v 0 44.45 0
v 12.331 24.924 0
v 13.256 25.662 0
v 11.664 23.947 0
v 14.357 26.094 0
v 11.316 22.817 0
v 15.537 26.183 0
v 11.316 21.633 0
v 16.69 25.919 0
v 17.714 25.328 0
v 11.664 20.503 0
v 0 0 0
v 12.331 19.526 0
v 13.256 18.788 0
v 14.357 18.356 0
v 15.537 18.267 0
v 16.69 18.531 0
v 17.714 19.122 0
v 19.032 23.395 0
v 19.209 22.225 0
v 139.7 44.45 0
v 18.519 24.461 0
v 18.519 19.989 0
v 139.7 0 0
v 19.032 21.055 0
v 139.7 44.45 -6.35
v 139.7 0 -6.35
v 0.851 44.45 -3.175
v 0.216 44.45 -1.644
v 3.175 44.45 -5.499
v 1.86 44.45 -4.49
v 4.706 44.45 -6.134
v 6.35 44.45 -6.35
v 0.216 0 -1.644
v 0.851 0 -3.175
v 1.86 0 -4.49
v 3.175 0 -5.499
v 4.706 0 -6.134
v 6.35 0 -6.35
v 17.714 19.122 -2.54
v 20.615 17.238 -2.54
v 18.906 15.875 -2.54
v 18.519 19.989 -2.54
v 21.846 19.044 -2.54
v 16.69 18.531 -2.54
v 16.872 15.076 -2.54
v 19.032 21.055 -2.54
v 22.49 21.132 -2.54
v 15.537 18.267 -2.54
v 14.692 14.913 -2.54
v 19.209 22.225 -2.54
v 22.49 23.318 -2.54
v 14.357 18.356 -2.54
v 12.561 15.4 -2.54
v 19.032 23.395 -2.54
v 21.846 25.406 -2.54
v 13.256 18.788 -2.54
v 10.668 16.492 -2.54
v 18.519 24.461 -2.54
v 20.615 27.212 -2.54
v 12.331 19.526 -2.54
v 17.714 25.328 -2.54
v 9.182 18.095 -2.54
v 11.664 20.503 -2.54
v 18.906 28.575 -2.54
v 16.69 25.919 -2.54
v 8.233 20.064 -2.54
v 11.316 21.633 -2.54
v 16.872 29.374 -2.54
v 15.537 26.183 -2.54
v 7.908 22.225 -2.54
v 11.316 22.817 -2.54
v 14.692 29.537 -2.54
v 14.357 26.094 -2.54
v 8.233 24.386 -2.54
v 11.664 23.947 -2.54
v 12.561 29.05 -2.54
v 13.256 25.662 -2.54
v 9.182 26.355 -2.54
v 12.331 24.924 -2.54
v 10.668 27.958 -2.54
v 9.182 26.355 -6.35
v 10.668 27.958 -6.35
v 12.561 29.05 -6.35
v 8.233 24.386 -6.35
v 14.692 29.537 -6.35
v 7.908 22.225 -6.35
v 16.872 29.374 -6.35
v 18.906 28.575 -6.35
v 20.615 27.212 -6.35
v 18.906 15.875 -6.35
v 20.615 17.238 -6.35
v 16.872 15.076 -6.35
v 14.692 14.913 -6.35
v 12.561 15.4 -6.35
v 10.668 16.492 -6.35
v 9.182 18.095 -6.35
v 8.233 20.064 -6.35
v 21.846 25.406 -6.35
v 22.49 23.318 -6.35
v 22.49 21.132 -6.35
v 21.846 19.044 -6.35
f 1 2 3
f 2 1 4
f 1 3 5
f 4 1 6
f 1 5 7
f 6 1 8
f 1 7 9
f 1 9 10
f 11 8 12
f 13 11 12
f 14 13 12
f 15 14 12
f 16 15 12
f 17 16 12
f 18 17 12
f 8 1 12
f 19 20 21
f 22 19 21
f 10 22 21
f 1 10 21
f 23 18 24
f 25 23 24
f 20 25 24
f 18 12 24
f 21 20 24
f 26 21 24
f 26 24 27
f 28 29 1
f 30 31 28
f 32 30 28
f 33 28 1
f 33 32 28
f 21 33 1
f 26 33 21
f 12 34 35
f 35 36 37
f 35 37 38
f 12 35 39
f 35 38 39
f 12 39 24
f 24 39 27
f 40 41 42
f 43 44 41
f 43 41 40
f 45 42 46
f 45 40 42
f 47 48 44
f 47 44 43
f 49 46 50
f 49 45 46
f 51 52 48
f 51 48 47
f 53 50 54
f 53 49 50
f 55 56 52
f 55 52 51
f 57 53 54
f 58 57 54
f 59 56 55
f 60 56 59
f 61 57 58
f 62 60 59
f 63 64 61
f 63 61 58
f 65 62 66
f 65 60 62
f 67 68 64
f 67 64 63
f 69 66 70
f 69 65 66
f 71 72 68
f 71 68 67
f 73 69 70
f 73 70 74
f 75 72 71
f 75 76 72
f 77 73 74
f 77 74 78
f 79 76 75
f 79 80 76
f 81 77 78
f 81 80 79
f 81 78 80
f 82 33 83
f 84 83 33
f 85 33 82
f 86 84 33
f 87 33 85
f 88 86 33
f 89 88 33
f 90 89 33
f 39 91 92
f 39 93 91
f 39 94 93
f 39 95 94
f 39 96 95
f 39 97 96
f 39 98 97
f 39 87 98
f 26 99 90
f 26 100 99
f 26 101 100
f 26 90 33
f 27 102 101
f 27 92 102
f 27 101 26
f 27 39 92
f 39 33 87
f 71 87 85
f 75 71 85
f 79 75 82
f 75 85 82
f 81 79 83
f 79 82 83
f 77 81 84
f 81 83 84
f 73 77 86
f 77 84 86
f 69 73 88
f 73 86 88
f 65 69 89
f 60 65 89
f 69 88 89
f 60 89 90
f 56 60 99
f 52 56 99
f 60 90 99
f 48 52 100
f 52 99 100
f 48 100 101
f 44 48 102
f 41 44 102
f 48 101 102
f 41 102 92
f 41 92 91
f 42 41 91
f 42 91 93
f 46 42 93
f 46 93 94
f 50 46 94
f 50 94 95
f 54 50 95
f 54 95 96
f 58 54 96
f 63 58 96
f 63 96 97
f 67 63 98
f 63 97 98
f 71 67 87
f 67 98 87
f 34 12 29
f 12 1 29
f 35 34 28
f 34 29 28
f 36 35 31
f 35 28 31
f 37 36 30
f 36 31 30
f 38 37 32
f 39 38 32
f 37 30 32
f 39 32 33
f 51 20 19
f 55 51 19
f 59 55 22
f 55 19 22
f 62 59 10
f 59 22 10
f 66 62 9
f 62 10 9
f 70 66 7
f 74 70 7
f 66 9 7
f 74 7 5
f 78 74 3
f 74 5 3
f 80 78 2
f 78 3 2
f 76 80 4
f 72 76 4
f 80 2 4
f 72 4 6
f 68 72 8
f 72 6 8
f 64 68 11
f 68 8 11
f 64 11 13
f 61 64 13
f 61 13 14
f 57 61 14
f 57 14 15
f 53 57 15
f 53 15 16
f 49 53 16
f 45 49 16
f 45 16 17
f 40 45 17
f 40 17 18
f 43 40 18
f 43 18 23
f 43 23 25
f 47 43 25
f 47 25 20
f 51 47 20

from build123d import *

# Parameters (mm, degrees)
SKETCH1_W           = 139.7
SKETCH1_H           = 6.35
BOSS_EXTRUDE1_DEPTH = 44.45
FILLET1_R           = 6.35
SKETCH4_R           = 3.96875
CUT_EXTRUDE2_DEPTH  = 254
SKETCH6_R           = 7.332348418
CUT_EXTRUDE4_DEPTH  = 3.81


with BuildPart() as part:
    # Sketch1 → Boss-Extrude1 (new body)
    with BuildSketch(Plane(origin=(0, 0, 0), x_dir=(1, 0, 0), z_dir=(0, 1, 0))):
        with Locations((69.85, 3.175)):
            Rectangle(SKETCH1_W, SKETCH1_H)
    extrude(amount=BOSS_EXTRUDE1_DEPTH)

    # Fillet1
    fillet1_edges = [part.edges().sort_by_distance(p)[0] for p in [
        (0, 22.225, -6.35),
    ]]
    fillet(fillet1_edges, radius=FILLET1_R - 0.0001)  # a hair under: the kernel refuses the full size

    # Sketch4 → Cut-Extrude2 (cut)
    with BuildSketch(Plane(origin=(69.948790088, 1.415162488, 139.7), x_dir=(1, 0, 0), z_dir=(0, 0, 1))):
        with Locations((-54.708790088, 20.809837512)):
            Circle(SKETCH4_R)
    extrude(amount=-CUT_EXTRUDE2_DEPTH, mode=Mode.SUBTRACT)

    # Sketch6 → Cut-Extrude4 (cut)
    with BuildSketch(Plane(origin=(0, 0, -6.35), x_dir=(-1, 0, 0), z_dir=(0, 0, -1))):
        with Locations((-15.24, 22.225)):
            Circle(SKETCH6_R)
    extrude(amount=-CUT_EXTRUDE4_DEPTH, mode=Mode.SUBTRACT)


solid = part.part
